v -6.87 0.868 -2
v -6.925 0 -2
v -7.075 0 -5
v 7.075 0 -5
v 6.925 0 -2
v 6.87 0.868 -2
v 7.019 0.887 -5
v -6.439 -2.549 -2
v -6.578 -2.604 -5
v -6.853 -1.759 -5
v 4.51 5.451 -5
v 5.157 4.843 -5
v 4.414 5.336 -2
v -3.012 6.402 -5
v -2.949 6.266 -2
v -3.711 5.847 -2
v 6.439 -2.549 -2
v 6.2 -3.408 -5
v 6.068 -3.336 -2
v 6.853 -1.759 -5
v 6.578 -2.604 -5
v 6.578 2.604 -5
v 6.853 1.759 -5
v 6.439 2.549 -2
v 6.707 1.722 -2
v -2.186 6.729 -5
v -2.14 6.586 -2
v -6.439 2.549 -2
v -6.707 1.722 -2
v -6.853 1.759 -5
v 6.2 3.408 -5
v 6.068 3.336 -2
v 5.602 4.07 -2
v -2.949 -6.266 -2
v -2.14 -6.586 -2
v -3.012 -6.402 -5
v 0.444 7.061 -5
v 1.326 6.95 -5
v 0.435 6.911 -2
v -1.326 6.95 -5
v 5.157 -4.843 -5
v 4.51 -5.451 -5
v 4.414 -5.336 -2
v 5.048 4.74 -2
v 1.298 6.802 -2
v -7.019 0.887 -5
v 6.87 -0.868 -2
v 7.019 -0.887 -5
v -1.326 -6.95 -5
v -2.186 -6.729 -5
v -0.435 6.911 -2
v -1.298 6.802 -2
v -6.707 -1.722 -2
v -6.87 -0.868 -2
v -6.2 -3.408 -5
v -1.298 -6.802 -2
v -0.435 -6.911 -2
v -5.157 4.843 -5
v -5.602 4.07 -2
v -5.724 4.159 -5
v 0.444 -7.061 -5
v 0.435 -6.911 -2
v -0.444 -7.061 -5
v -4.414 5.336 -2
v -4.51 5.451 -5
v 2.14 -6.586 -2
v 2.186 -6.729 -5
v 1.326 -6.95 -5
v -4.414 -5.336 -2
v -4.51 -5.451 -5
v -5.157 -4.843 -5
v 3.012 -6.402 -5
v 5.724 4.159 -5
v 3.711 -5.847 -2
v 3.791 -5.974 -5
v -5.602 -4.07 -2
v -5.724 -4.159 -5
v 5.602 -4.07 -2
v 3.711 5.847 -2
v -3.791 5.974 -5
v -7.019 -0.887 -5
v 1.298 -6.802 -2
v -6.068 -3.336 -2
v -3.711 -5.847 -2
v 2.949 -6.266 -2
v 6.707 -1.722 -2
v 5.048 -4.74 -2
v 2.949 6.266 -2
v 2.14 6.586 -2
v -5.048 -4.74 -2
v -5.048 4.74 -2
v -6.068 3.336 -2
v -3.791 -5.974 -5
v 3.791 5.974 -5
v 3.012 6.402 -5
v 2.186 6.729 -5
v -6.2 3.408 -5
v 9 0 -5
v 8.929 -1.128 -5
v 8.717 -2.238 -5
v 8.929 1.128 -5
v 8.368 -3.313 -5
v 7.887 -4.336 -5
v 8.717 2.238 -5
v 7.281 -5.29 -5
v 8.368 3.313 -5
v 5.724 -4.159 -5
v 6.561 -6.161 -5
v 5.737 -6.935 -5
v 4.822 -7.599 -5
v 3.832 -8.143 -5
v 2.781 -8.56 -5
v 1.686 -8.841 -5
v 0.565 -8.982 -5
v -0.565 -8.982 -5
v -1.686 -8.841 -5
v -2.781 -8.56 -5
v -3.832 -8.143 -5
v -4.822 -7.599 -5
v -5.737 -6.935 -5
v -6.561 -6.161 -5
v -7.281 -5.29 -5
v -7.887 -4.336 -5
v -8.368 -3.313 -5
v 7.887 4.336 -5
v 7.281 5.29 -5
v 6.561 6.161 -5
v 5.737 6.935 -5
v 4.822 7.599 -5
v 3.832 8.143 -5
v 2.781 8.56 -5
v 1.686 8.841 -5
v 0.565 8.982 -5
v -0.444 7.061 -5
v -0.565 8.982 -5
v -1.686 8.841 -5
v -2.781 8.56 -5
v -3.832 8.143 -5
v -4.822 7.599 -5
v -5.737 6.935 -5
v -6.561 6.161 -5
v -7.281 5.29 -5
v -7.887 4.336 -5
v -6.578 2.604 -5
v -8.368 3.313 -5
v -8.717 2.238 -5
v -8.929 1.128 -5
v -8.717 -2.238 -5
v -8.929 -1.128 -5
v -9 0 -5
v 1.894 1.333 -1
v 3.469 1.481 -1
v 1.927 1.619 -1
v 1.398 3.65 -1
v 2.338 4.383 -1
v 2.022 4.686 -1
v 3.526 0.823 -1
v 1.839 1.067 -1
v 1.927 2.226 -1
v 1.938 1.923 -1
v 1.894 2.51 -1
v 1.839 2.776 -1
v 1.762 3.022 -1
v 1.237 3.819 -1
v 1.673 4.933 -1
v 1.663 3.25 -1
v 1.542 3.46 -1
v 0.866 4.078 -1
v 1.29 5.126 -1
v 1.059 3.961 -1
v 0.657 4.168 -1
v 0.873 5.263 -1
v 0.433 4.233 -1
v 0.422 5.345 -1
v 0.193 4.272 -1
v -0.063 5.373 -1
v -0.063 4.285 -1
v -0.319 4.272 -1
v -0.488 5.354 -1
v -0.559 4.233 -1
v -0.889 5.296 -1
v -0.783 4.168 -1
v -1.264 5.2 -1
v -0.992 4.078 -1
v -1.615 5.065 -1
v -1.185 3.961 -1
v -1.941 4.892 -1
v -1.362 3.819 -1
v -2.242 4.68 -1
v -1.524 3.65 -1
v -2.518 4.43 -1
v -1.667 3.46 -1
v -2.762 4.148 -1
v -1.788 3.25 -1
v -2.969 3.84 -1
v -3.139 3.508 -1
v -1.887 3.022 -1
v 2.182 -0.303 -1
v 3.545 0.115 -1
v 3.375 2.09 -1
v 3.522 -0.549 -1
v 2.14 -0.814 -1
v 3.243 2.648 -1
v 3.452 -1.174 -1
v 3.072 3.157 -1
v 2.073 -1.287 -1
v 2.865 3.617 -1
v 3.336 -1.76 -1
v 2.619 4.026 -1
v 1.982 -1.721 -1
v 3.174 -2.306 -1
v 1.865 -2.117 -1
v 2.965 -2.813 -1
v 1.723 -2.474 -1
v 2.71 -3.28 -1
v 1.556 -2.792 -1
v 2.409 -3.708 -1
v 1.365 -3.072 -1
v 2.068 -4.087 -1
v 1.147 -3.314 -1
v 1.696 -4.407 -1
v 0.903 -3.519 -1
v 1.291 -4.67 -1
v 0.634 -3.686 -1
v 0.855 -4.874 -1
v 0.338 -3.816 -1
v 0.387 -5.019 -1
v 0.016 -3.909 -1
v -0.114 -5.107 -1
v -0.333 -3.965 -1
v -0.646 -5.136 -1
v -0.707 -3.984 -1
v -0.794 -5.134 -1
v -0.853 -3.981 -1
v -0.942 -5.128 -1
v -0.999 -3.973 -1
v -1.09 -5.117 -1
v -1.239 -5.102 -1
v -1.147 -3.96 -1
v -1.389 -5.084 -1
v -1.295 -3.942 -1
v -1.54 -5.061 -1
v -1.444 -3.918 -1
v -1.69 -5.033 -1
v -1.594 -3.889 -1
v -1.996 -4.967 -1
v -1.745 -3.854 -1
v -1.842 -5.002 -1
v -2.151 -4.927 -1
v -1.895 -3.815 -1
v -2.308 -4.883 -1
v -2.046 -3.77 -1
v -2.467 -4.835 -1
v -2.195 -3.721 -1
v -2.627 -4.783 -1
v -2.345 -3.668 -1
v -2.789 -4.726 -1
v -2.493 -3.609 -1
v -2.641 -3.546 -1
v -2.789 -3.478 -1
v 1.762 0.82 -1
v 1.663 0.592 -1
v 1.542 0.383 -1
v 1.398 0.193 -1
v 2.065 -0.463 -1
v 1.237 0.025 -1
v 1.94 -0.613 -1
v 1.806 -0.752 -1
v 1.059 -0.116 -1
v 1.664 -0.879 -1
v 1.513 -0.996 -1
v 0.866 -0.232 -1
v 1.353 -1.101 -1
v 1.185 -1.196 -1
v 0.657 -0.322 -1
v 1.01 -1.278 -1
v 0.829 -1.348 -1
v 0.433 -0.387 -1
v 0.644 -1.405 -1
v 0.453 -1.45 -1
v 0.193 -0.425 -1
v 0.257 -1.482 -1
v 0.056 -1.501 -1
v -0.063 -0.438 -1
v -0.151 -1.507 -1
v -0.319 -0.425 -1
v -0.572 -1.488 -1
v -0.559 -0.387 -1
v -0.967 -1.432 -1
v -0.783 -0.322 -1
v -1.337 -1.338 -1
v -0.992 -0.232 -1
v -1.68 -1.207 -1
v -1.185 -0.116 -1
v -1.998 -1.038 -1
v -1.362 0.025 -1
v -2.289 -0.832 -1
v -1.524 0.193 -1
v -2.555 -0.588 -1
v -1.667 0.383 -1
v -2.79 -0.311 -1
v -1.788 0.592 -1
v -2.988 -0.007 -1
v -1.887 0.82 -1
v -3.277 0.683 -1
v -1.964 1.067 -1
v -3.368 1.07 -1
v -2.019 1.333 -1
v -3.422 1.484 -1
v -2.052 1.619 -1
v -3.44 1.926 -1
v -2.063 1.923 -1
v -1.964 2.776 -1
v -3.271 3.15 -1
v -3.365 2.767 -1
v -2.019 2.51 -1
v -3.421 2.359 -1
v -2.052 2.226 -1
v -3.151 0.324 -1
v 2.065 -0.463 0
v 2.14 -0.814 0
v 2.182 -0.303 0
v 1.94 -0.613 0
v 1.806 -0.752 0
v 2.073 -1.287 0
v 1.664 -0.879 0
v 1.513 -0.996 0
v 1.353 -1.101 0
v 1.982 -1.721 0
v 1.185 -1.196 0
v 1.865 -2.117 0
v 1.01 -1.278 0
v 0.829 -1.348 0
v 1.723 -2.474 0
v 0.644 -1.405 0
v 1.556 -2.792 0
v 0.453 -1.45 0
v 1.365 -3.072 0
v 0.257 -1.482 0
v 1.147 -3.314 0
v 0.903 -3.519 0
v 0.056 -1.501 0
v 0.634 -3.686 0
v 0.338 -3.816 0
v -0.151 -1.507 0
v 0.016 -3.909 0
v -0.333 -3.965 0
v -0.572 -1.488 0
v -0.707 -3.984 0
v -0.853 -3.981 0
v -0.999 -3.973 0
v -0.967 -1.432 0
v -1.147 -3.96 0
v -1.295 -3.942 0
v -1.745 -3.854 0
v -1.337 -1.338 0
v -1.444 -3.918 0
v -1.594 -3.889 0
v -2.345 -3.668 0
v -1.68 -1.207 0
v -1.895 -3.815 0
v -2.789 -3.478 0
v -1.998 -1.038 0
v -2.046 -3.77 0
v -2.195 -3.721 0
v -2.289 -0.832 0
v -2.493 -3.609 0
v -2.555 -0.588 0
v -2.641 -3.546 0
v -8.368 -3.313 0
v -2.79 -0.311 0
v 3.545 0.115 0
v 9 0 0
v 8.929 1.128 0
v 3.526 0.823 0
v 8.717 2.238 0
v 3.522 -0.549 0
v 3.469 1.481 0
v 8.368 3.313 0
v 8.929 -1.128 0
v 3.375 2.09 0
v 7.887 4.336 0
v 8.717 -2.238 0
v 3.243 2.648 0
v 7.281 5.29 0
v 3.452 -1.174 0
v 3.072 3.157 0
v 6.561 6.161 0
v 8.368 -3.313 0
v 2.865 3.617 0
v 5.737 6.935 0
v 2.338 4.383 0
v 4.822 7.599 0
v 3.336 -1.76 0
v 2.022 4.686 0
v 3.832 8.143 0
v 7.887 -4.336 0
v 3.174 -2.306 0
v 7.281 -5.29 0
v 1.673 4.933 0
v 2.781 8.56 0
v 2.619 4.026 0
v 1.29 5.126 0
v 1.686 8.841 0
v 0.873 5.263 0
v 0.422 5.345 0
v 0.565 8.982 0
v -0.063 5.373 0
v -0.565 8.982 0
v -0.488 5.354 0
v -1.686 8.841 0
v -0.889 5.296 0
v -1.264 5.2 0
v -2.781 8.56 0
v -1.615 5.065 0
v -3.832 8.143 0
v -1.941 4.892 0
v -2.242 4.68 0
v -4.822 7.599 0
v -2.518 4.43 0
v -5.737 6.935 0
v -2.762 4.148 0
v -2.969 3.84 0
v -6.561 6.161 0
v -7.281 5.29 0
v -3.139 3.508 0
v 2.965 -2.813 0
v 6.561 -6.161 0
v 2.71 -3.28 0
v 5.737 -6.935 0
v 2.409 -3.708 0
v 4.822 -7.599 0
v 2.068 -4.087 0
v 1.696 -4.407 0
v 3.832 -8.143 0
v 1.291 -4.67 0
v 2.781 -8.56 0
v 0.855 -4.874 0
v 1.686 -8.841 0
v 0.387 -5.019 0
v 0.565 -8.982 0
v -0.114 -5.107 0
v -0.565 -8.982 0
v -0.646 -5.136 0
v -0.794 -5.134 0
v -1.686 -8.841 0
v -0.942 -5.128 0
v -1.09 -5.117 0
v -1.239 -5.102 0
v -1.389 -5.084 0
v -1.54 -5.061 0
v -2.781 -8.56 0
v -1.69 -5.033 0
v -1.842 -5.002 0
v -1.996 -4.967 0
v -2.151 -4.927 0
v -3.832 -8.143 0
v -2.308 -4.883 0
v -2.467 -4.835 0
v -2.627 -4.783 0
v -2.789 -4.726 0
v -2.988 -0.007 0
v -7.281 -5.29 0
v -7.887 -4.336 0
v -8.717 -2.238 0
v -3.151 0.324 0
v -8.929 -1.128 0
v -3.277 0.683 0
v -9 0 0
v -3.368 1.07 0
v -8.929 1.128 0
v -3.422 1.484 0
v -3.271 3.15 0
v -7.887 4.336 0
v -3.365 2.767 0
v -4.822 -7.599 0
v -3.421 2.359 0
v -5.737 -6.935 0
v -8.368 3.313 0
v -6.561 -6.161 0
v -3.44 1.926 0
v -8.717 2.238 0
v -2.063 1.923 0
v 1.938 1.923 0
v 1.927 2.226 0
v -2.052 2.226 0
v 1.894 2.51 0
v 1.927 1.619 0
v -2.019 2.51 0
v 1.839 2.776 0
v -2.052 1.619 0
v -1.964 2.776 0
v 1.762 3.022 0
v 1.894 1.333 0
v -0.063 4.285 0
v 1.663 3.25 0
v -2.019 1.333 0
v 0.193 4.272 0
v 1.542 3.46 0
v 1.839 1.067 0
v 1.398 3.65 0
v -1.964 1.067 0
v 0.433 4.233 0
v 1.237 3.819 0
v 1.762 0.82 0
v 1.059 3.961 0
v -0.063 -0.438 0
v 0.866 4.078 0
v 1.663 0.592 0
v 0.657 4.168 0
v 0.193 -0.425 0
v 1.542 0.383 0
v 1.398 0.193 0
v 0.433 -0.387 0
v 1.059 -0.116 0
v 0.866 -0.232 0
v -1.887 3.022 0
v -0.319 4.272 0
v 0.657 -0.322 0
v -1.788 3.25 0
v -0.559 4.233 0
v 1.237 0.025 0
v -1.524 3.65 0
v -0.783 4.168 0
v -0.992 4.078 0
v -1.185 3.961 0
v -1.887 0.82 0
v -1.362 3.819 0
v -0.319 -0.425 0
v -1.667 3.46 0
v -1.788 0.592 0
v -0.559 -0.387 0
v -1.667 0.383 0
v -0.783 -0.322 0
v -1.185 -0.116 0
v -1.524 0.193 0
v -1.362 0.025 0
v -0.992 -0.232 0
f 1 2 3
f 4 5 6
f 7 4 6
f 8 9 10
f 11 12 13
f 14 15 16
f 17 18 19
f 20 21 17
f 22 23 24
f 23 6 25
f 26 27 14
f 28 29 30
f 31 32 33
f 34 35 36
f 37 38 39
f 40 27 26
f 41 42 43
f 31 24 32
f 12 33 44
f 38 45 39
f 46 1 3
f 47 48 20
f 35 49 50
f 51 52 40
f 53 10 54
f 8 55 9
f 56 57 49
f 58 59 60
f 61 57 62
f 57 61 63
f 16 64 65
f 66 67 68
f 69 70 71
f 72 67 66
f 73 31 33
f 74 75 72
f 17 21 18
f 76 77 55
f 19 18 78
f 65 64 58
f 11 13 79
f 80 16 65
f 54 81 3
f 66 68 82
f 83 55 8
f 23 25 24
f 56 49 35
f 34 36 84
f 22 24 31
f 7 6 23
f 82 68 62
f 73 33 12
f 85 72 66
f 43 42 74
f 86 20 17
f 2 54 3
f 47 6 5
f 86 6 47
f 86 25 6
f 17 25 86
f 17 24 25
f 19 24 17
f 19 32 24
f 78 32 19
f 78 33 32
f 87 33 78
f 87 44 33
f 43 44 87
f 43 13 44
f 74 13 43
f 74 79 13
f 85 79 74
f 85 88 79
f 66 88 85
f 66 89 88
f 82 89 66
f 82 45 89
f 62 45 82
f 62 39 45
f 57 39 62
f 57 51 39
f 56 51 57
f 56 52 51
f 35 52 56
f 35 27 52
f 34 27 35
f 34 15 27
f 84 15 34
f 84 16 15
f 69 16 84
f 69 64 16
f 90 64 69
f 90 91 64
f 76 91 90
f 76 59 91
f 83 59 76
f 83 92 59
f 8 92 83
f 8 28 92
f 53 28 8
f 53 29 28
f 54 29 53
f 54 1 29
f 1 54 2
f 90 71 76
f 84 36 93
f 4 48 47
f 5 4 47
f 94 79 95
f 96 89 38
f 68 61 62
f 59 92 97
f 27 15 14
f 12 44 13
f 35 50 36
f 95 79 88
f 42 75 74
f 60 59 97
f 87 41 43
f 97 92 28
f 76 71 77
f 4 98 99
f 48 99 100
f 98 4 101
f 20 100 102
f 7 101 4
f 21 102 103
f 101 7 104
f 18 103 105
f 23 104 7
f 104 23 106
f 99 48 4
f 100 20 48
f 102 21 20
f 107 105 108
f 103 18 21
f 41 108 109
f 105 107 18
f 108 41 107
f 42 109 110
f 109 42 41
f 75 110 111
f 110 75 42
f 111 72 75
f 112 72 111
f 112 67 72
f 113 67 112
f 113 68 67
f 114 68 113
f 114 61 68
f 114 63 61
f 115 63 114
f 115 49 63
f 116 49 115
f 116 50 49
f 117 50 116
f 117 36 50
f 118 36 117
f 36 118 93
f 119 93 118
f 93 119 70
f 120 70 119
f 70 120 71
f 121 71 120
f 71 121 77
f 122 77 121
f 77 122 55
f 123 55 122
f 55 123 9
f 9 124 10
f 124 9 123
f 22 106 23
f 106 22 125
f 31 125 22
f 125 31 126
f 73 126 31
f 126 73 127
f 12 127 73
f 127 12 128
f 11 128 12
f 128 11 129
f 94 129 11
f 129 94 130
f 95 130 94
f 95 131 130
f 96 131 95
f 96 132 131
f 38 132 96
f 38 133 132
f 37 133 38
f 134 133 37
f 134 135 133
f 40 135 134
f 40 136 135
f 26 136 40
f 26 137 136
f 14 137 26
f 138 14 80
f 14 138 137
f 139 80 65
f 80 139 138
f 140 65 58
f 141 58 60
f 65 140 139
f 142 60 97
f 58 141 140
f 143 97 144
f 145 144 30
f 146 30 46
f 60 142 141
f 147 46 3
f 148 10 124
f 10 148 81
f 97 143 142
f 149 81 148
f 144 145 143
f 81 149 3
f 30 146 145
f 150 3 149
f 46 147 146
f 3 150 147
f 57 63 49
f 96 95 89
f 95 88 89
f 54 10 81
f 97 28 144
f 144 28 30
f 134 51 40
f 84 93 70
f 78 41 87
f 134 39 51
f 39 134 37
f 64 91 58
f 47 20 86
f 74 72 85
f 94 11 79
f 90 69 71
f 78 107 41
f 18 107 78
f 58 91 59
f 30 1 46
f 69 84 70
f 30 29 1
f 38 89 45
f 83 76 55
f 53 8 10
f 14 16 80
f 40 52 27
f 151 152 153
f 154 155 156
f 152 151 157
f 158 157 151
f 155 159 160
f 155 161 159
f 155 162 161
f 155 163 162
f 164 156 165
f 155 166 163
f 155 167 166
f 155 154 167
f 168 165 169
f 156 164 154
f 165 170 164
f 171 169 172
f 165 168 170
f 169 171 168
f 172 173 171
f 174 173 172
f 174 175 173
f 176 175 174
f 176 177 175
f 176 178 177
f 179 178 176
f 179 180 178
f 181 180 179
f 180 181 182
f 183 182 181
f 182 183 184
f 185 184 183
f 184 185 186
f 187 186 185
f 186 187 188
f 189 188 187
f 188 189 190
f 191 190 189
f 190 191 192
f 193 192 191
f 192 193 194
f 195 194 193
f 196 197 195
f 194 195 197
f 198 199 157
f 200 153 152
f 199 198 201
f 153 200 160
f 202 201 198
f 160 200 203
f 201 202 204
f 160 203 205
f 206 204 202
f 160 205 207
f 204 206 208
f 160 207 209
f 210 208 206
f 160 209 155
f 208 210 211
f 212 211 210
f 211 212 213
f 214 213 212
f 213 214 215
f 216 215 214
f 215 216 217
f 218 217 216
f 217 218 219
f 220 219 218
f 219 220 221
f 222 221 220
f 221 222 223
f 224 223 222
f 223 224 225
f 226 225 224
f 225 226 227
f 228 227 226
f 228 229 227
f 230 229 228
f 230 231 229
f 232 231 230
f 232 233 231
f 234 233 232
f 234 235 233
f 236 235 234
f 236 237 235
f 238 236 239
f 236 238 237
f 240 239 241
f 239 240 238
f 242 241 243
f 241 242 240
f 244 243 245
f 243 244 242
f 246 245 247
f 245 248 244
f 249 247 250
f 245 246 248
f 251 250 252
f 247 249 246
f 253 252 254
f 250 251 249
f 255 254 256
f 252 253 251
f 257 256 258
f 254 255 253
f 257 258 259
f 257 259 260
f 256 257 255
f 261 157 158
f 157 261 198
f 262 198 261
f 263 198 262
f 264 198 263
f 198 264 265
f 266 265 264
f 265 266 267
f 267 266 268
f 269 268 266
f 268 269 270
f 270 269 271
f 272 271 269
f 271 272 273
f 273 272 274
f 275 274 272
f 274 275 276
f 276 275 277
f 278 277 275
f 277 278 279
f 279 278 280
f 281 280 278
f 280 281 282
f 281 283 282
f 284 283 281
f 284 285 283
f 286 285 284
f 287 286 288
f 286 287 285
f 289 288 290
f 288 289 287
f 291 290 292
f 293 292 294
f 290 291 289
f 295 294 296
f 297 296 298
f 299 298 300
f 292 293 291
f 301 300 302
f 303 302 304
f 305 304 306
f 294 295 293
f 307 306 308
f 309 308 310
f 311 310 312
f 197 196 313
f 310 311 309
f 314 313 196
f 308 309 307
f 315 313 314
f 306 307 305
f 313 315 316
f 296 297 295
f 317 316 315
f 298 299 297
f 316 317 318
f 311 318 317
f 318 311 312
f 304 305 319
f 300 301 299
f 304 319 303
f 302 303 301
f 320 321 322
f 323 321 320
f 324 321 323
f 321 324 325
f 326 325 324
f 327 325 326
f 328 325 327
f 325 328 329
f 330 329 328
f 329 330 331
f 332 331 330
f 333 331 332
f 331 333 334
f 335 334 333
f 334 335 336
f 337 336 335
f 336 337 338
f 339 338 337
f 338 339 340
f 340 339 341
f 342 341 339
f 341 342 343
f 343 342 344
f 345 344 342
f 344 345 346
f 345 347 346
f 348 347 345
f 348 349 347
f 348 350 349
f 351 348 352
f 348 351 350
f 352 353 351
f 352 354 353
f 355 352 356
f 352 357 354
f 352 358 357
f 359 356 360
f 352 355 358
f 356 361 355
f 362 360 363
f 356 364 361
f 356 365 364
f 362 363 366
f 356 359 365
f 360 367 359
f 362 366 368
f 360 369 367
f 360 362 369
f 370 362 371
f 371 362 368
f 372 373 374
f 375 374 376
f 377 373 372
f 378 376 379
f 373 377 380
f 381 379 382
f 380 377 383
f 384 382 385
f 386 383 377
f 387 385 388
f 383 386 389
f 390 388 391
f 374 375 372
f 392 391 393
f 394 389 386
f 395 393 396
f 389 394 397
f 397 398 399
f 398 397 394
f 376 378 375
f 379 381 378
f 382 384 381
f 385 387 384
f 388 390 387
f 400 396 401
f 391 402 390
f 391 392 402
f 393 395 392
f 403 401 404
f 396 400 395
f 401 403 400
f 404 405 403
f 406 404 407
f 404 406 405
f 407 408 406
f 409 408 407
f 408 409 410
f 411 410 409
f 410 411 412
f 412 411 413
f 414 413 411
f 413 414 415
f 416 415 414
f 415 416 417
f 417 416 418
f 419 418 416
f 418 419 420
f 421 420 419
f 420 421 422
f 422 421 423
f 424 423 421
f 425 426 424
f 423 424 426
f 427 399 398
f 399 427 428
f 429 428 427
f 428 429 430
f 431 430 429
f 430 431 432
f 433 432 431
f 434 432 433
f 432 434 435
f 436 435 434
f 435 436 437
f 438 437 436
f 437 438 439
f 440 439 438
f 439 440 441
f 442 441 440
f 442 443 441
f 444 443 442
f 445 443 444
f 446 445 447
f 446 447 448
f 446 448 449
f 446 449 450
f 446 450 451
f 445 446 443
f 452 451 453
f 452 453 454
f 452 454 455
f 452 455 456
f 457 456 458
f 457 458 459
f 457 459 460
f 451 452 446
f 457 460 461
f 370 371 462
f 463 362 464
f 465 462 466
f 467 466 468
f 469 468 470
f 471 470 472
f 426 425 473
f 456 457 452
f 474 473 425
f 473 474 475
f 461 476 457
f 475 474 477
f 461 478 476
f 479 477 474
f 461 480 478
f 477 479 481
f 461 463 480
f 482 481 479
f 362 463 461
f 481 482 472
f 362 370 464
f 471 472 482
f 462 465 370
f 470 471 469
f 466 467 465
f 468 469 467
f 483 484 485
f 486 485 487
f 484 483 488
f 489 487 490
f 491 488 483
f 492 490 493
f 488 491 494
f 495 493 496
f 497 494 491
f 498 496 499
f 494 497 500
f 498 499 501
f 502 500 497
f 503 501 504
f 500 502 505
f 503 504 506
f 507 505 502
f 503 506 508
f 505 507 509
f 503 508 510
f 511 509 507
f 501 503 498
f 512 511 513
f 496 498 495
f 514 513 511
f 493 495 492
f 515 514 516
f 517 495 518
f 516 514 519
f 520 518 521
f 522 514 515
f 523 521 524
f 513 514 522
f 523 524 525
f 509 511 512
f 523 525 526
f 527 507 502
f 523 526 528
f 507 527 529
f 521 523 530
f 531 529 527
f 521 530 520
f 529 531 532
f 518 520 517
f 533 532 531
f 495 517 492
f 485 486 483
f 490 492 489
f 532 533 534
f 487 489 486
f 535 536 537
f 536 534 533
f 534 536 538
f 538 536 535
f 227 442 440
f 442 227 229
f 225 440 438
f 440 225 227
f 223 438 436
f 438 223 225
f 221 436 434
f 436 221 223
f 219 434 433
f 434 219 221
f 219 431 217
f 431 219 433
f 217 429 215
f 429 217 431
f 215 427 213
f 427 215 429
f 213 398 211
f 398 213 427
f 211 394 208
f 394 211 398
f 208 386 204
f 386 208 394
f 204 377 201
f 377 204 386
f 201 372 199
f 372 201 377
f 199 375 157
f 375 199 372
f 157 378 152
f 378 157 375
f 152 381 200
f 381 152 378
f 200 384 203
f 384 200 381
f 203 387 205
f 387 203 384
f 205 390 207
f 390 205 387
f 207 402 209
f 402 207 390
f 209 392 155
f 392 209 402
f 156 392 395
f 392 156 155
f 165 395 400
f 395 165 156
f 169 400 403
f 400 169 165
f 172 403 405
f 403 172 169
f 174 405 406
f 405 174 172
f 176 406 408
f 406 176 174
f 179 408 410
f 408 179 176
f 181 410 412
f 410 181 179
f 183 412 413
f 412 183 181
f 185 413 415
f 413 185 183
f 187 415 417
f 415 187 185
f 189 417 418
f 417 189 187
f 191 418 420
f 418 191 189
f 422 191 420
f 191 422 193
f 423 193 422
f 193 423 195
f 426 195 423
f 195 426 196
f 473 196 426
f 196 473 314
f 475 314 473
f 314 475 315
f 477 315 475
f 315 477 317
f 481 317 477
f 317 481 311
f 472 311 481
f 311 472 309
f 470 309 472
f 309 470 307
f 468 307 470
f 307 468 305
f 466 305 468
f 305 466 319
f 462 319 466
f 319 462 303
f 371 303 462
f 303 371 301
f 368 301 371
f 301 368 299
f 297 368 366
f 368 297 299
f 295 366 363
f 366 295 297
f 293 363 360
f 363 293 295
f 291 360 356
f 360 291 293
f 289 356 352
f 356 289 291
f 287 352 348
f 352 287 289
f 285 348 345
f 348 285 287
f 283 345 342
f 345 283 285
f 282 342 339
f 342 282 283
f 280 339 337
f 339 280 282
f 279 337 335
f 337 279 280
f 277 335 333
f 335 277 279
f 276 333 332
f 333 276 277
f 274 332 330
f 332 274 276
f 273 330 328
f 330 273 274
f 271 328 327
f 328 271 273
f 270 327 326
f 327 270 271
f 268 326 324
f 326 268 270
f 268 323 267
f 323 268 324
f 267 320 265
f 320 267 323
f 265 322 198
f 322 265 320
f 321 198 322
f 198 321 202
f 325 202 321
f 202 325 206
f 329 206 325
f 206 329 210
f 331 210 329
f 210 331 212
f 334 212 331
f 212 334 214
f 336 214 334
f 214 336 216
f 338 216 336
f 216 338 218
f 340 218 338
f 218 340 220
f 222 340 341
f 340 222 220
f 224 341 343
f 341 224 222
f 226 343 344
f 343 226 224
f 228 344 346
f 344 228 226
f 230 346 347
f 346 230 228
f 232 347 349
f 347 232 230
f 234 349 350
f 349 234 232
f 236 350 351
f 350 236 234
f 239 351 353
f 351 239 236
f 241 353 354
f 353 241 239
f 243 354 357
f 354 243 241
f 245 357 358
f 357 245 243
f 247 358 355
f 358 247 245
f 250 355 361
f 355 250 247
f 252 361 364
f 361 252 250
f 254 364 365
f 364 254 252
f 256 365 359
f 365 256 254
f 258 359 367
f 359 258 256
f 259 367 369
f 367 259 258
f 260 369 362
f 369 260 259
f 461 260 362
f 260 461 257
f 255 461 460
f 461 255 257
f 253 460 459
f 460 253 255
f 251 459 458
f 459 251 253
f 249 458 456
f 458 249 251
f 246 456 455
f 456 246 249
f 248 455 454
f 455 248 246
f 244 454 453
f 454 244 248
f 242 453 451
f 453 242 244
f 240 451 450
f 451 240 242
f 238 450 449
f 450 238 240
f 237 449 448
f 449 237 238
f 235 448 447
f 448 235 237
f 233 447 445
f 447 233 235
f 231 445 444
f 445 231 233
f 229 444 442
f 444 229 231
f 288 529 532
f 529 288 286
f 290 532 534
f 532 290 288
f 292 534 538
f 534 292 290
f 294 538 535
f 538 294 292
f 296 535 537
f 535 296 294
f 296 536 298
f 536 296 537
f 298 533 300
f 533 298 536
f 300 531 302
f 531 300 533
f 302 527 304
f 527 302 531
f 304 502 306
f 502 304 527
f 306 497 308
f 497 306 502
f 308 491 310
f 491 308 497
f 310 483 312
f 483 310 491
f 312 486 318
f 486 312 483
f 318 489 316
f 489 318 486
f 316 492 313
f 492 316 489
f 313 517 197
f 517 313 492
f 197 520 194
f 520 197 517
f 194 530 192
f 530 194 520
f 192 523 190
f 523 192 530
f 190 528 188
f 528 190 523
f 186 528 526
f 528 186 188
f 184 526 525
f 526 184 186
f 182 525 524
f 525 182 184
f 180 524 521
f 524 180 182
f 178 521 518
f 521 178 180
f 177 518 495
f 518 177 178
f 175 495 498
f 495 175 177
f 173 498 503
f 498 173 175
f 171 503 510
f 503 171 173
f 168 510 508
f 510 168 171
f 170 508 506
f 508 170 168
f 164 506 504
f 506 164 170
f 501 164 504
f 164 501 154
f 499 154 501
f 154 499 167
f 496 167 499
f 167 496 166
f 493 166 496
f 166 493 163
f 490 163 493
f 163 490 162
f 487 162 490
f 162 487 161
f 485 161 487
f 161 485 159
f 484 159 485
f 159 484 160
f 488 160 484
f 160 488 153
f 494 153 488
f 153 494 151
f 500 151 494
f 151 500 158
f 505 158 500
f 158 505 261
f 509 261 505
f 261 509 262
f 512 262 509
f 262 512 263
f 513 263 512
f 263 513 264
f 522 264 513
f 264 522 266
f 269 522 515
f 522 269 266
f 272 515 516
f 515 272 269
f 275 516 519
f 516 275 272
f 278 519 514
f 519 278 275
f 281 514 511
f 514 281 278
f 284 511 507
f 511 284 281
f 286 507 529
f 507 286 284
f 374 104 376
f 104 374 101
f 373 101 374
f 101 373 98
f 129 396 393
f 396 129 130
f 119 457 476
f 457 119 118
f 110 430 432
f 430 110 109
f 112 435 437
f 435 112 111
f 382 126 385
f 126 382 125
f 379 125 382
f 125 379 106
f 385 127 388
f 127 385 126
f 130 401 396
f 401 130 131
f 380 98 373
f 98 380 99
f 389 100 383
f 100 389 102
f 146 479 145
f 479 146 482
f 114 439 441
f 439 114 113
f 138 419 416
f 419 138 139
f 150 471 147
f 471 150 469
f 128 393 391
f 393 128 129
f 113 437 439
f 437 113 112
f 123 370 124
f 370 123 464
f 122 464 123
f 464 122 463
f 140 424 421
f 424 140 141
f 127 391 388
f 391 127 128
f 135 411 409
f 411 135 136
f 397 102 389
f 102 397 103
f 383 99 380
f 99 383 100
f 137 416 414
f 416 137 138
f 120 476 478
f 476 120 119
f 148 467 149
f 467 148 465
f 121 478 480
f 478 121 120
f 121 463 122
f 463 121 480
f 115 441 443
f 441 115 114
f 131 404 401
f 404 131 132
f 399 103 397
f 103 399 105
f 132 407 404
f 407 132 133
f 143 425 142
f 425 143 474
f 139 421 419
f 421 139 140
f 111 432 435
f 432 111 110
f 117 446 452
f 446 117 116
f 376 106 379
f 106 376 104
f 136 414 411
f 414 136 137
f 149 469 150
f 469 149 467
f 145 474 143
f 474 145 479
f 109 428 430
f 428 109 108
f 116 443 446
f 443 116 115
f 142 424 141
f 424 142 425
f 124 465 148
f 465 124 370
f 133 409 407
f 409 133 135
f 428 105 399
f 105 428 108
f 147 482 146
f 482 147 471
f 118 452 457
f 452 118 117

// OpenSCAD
$fn = 50;

difference() {
	union() {
		translate(v = [0, 0, -5.0]) {
			cylinder(h = 5, r = 9.0);
		}
	}
	union() {
		#translate(v = [0, 0, -5.0]) {
			cylinder(h = 3, r1 = 7.075, r2 = 6.925);
		}
		translate(v = [0, 0, -1]) {
			linear_extrude(height = 1) {
				text(font = "Impact", halign = "center", size = 10, text = "9", valign = "center");
			}
		}
	}
}
